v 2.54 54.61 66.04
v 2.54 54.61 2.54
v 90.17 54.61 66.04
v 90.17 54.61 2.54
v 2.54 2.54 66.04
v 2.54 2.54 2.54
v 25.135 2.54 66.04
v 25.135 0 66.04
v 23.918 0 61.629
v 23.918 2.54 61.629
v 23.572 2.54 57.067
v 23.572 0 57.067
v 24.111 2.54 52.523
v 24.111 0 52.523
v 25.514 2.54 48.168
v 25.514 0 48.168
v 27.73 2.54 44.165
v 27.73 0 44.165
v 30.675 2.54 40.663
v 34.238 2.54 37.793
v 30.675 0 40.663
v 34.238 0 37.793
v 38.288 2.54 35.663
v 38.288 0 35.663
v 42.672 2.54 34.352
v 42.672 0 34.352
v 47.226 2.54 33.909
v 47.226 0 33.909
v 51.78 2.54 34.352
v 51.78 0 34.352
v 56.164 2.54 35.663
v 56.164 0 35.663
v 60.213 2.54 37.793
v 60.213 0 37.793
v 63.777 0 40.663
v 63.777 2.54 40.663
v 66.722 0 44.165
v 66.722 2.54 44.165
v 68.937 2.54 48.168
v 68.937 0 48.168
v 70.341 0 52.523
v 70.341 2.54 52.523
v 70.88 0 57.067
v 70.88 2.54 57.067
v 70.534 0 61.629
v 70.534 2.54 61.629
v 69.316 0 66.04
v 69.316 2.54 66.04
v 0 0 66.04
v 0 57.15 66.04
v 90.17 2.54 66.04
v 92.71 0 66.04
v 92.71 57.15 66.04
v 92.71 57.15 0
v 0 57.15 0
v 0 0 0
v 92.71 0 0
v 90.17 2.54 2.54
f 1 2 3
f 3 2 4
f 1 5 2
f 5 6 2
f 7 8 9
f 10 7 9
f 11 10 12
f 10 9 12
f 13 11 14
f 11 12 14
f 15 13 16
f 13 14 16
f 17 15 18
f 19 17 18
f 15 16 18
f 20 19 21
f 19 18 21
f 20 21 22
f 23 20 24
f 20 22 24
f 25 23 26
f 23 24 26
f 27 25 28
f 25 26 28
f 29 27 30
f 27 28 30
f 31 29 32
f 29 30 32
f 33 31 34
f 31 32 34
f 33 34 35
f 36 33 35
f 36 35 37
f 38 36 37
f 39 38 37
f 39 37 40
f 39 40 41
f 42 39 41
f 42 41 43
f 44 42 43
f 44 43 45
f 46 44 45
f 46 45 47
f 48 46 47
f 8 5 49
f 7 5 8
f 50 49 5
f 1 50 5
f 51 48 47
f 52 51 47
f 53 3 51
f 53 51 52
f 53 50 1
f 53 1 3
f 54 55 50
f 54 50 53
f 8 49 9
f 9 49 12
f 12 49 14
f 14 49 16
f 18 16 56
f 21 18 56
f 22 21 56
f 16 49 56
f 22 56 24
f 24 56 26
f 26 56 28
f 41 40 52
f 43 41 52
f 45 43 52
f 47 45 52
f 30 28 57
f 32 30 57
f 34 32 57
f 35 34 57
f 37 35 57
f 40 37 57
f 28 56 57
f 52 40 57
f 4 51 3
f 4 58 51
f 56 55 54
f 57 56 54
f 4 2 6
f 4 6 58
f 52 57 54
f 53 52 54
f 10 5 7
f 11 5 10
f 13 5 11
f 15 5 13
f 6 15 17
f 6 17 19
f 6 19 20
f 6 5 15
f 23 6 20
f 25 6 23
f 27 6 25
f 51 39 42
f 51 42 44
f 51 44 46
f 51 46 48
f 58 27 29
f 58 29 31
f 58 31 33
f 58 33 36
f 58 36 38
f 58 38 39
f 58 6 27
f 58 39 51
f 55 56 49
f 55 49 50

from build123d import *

# Parameters (mm, degrees)
F0_W     = 92.71
F0_H     = 57.15
F1_DEPTH = 66.04
F2_T     = -2.54
F4_DEPTH = 25.4
F6_DEPTH = 25.4


with BuildPart() as f1:
    # F0 (on Top) → F1 (new body)
    with BuildSketch(Plane.XY):
        with Locations((46.355, 28.575)):
            Rectangle(F0_W, F0_H)
    extrude(amount=F1_DEPTH)

    # F2
    f2_openings = [f1.faces().sort_by_distance(p)[0] for p in [
        (46.355, 28.575, 66.04),
    ]]
    offset(amount=F2_T, openings=f2_openings)

    # F3 (on face) → F4 (cut)
    with BuildSketch(Plane.XZ):
        with BuildLine():
            Line((56.342959, 66.04), (36.00914, 66.04))
            ThreePointArc((36.00914, 66.04), (46.17605, 50.051373), (56.342959, 66.04))
        make_face()
    extrude(amount=-F4_DEPTH, mode=Mode.SUBTRACT)

    # F5 (on face) → F6 (cut)
    with BuildSketch(Plane.XZ):
        with BuildLine():
            Line((36.00914, 66.04), (25.135325, 66.04))
            ThreePointArc((25.135325, 66.04), (47.225845, 33.909376), (69.316365, 66.04))
            Line((69.316365, 66.04), (56.342959, 66.04))
            ThreePointArc((56.342959, 66.04), (46.17605, 50.051373), (36.00914, 66.04))
        make_face()
    extrude(amount=-F6_DEPTH, mode=Mode.SUBTRACT)


solid = f1.part
